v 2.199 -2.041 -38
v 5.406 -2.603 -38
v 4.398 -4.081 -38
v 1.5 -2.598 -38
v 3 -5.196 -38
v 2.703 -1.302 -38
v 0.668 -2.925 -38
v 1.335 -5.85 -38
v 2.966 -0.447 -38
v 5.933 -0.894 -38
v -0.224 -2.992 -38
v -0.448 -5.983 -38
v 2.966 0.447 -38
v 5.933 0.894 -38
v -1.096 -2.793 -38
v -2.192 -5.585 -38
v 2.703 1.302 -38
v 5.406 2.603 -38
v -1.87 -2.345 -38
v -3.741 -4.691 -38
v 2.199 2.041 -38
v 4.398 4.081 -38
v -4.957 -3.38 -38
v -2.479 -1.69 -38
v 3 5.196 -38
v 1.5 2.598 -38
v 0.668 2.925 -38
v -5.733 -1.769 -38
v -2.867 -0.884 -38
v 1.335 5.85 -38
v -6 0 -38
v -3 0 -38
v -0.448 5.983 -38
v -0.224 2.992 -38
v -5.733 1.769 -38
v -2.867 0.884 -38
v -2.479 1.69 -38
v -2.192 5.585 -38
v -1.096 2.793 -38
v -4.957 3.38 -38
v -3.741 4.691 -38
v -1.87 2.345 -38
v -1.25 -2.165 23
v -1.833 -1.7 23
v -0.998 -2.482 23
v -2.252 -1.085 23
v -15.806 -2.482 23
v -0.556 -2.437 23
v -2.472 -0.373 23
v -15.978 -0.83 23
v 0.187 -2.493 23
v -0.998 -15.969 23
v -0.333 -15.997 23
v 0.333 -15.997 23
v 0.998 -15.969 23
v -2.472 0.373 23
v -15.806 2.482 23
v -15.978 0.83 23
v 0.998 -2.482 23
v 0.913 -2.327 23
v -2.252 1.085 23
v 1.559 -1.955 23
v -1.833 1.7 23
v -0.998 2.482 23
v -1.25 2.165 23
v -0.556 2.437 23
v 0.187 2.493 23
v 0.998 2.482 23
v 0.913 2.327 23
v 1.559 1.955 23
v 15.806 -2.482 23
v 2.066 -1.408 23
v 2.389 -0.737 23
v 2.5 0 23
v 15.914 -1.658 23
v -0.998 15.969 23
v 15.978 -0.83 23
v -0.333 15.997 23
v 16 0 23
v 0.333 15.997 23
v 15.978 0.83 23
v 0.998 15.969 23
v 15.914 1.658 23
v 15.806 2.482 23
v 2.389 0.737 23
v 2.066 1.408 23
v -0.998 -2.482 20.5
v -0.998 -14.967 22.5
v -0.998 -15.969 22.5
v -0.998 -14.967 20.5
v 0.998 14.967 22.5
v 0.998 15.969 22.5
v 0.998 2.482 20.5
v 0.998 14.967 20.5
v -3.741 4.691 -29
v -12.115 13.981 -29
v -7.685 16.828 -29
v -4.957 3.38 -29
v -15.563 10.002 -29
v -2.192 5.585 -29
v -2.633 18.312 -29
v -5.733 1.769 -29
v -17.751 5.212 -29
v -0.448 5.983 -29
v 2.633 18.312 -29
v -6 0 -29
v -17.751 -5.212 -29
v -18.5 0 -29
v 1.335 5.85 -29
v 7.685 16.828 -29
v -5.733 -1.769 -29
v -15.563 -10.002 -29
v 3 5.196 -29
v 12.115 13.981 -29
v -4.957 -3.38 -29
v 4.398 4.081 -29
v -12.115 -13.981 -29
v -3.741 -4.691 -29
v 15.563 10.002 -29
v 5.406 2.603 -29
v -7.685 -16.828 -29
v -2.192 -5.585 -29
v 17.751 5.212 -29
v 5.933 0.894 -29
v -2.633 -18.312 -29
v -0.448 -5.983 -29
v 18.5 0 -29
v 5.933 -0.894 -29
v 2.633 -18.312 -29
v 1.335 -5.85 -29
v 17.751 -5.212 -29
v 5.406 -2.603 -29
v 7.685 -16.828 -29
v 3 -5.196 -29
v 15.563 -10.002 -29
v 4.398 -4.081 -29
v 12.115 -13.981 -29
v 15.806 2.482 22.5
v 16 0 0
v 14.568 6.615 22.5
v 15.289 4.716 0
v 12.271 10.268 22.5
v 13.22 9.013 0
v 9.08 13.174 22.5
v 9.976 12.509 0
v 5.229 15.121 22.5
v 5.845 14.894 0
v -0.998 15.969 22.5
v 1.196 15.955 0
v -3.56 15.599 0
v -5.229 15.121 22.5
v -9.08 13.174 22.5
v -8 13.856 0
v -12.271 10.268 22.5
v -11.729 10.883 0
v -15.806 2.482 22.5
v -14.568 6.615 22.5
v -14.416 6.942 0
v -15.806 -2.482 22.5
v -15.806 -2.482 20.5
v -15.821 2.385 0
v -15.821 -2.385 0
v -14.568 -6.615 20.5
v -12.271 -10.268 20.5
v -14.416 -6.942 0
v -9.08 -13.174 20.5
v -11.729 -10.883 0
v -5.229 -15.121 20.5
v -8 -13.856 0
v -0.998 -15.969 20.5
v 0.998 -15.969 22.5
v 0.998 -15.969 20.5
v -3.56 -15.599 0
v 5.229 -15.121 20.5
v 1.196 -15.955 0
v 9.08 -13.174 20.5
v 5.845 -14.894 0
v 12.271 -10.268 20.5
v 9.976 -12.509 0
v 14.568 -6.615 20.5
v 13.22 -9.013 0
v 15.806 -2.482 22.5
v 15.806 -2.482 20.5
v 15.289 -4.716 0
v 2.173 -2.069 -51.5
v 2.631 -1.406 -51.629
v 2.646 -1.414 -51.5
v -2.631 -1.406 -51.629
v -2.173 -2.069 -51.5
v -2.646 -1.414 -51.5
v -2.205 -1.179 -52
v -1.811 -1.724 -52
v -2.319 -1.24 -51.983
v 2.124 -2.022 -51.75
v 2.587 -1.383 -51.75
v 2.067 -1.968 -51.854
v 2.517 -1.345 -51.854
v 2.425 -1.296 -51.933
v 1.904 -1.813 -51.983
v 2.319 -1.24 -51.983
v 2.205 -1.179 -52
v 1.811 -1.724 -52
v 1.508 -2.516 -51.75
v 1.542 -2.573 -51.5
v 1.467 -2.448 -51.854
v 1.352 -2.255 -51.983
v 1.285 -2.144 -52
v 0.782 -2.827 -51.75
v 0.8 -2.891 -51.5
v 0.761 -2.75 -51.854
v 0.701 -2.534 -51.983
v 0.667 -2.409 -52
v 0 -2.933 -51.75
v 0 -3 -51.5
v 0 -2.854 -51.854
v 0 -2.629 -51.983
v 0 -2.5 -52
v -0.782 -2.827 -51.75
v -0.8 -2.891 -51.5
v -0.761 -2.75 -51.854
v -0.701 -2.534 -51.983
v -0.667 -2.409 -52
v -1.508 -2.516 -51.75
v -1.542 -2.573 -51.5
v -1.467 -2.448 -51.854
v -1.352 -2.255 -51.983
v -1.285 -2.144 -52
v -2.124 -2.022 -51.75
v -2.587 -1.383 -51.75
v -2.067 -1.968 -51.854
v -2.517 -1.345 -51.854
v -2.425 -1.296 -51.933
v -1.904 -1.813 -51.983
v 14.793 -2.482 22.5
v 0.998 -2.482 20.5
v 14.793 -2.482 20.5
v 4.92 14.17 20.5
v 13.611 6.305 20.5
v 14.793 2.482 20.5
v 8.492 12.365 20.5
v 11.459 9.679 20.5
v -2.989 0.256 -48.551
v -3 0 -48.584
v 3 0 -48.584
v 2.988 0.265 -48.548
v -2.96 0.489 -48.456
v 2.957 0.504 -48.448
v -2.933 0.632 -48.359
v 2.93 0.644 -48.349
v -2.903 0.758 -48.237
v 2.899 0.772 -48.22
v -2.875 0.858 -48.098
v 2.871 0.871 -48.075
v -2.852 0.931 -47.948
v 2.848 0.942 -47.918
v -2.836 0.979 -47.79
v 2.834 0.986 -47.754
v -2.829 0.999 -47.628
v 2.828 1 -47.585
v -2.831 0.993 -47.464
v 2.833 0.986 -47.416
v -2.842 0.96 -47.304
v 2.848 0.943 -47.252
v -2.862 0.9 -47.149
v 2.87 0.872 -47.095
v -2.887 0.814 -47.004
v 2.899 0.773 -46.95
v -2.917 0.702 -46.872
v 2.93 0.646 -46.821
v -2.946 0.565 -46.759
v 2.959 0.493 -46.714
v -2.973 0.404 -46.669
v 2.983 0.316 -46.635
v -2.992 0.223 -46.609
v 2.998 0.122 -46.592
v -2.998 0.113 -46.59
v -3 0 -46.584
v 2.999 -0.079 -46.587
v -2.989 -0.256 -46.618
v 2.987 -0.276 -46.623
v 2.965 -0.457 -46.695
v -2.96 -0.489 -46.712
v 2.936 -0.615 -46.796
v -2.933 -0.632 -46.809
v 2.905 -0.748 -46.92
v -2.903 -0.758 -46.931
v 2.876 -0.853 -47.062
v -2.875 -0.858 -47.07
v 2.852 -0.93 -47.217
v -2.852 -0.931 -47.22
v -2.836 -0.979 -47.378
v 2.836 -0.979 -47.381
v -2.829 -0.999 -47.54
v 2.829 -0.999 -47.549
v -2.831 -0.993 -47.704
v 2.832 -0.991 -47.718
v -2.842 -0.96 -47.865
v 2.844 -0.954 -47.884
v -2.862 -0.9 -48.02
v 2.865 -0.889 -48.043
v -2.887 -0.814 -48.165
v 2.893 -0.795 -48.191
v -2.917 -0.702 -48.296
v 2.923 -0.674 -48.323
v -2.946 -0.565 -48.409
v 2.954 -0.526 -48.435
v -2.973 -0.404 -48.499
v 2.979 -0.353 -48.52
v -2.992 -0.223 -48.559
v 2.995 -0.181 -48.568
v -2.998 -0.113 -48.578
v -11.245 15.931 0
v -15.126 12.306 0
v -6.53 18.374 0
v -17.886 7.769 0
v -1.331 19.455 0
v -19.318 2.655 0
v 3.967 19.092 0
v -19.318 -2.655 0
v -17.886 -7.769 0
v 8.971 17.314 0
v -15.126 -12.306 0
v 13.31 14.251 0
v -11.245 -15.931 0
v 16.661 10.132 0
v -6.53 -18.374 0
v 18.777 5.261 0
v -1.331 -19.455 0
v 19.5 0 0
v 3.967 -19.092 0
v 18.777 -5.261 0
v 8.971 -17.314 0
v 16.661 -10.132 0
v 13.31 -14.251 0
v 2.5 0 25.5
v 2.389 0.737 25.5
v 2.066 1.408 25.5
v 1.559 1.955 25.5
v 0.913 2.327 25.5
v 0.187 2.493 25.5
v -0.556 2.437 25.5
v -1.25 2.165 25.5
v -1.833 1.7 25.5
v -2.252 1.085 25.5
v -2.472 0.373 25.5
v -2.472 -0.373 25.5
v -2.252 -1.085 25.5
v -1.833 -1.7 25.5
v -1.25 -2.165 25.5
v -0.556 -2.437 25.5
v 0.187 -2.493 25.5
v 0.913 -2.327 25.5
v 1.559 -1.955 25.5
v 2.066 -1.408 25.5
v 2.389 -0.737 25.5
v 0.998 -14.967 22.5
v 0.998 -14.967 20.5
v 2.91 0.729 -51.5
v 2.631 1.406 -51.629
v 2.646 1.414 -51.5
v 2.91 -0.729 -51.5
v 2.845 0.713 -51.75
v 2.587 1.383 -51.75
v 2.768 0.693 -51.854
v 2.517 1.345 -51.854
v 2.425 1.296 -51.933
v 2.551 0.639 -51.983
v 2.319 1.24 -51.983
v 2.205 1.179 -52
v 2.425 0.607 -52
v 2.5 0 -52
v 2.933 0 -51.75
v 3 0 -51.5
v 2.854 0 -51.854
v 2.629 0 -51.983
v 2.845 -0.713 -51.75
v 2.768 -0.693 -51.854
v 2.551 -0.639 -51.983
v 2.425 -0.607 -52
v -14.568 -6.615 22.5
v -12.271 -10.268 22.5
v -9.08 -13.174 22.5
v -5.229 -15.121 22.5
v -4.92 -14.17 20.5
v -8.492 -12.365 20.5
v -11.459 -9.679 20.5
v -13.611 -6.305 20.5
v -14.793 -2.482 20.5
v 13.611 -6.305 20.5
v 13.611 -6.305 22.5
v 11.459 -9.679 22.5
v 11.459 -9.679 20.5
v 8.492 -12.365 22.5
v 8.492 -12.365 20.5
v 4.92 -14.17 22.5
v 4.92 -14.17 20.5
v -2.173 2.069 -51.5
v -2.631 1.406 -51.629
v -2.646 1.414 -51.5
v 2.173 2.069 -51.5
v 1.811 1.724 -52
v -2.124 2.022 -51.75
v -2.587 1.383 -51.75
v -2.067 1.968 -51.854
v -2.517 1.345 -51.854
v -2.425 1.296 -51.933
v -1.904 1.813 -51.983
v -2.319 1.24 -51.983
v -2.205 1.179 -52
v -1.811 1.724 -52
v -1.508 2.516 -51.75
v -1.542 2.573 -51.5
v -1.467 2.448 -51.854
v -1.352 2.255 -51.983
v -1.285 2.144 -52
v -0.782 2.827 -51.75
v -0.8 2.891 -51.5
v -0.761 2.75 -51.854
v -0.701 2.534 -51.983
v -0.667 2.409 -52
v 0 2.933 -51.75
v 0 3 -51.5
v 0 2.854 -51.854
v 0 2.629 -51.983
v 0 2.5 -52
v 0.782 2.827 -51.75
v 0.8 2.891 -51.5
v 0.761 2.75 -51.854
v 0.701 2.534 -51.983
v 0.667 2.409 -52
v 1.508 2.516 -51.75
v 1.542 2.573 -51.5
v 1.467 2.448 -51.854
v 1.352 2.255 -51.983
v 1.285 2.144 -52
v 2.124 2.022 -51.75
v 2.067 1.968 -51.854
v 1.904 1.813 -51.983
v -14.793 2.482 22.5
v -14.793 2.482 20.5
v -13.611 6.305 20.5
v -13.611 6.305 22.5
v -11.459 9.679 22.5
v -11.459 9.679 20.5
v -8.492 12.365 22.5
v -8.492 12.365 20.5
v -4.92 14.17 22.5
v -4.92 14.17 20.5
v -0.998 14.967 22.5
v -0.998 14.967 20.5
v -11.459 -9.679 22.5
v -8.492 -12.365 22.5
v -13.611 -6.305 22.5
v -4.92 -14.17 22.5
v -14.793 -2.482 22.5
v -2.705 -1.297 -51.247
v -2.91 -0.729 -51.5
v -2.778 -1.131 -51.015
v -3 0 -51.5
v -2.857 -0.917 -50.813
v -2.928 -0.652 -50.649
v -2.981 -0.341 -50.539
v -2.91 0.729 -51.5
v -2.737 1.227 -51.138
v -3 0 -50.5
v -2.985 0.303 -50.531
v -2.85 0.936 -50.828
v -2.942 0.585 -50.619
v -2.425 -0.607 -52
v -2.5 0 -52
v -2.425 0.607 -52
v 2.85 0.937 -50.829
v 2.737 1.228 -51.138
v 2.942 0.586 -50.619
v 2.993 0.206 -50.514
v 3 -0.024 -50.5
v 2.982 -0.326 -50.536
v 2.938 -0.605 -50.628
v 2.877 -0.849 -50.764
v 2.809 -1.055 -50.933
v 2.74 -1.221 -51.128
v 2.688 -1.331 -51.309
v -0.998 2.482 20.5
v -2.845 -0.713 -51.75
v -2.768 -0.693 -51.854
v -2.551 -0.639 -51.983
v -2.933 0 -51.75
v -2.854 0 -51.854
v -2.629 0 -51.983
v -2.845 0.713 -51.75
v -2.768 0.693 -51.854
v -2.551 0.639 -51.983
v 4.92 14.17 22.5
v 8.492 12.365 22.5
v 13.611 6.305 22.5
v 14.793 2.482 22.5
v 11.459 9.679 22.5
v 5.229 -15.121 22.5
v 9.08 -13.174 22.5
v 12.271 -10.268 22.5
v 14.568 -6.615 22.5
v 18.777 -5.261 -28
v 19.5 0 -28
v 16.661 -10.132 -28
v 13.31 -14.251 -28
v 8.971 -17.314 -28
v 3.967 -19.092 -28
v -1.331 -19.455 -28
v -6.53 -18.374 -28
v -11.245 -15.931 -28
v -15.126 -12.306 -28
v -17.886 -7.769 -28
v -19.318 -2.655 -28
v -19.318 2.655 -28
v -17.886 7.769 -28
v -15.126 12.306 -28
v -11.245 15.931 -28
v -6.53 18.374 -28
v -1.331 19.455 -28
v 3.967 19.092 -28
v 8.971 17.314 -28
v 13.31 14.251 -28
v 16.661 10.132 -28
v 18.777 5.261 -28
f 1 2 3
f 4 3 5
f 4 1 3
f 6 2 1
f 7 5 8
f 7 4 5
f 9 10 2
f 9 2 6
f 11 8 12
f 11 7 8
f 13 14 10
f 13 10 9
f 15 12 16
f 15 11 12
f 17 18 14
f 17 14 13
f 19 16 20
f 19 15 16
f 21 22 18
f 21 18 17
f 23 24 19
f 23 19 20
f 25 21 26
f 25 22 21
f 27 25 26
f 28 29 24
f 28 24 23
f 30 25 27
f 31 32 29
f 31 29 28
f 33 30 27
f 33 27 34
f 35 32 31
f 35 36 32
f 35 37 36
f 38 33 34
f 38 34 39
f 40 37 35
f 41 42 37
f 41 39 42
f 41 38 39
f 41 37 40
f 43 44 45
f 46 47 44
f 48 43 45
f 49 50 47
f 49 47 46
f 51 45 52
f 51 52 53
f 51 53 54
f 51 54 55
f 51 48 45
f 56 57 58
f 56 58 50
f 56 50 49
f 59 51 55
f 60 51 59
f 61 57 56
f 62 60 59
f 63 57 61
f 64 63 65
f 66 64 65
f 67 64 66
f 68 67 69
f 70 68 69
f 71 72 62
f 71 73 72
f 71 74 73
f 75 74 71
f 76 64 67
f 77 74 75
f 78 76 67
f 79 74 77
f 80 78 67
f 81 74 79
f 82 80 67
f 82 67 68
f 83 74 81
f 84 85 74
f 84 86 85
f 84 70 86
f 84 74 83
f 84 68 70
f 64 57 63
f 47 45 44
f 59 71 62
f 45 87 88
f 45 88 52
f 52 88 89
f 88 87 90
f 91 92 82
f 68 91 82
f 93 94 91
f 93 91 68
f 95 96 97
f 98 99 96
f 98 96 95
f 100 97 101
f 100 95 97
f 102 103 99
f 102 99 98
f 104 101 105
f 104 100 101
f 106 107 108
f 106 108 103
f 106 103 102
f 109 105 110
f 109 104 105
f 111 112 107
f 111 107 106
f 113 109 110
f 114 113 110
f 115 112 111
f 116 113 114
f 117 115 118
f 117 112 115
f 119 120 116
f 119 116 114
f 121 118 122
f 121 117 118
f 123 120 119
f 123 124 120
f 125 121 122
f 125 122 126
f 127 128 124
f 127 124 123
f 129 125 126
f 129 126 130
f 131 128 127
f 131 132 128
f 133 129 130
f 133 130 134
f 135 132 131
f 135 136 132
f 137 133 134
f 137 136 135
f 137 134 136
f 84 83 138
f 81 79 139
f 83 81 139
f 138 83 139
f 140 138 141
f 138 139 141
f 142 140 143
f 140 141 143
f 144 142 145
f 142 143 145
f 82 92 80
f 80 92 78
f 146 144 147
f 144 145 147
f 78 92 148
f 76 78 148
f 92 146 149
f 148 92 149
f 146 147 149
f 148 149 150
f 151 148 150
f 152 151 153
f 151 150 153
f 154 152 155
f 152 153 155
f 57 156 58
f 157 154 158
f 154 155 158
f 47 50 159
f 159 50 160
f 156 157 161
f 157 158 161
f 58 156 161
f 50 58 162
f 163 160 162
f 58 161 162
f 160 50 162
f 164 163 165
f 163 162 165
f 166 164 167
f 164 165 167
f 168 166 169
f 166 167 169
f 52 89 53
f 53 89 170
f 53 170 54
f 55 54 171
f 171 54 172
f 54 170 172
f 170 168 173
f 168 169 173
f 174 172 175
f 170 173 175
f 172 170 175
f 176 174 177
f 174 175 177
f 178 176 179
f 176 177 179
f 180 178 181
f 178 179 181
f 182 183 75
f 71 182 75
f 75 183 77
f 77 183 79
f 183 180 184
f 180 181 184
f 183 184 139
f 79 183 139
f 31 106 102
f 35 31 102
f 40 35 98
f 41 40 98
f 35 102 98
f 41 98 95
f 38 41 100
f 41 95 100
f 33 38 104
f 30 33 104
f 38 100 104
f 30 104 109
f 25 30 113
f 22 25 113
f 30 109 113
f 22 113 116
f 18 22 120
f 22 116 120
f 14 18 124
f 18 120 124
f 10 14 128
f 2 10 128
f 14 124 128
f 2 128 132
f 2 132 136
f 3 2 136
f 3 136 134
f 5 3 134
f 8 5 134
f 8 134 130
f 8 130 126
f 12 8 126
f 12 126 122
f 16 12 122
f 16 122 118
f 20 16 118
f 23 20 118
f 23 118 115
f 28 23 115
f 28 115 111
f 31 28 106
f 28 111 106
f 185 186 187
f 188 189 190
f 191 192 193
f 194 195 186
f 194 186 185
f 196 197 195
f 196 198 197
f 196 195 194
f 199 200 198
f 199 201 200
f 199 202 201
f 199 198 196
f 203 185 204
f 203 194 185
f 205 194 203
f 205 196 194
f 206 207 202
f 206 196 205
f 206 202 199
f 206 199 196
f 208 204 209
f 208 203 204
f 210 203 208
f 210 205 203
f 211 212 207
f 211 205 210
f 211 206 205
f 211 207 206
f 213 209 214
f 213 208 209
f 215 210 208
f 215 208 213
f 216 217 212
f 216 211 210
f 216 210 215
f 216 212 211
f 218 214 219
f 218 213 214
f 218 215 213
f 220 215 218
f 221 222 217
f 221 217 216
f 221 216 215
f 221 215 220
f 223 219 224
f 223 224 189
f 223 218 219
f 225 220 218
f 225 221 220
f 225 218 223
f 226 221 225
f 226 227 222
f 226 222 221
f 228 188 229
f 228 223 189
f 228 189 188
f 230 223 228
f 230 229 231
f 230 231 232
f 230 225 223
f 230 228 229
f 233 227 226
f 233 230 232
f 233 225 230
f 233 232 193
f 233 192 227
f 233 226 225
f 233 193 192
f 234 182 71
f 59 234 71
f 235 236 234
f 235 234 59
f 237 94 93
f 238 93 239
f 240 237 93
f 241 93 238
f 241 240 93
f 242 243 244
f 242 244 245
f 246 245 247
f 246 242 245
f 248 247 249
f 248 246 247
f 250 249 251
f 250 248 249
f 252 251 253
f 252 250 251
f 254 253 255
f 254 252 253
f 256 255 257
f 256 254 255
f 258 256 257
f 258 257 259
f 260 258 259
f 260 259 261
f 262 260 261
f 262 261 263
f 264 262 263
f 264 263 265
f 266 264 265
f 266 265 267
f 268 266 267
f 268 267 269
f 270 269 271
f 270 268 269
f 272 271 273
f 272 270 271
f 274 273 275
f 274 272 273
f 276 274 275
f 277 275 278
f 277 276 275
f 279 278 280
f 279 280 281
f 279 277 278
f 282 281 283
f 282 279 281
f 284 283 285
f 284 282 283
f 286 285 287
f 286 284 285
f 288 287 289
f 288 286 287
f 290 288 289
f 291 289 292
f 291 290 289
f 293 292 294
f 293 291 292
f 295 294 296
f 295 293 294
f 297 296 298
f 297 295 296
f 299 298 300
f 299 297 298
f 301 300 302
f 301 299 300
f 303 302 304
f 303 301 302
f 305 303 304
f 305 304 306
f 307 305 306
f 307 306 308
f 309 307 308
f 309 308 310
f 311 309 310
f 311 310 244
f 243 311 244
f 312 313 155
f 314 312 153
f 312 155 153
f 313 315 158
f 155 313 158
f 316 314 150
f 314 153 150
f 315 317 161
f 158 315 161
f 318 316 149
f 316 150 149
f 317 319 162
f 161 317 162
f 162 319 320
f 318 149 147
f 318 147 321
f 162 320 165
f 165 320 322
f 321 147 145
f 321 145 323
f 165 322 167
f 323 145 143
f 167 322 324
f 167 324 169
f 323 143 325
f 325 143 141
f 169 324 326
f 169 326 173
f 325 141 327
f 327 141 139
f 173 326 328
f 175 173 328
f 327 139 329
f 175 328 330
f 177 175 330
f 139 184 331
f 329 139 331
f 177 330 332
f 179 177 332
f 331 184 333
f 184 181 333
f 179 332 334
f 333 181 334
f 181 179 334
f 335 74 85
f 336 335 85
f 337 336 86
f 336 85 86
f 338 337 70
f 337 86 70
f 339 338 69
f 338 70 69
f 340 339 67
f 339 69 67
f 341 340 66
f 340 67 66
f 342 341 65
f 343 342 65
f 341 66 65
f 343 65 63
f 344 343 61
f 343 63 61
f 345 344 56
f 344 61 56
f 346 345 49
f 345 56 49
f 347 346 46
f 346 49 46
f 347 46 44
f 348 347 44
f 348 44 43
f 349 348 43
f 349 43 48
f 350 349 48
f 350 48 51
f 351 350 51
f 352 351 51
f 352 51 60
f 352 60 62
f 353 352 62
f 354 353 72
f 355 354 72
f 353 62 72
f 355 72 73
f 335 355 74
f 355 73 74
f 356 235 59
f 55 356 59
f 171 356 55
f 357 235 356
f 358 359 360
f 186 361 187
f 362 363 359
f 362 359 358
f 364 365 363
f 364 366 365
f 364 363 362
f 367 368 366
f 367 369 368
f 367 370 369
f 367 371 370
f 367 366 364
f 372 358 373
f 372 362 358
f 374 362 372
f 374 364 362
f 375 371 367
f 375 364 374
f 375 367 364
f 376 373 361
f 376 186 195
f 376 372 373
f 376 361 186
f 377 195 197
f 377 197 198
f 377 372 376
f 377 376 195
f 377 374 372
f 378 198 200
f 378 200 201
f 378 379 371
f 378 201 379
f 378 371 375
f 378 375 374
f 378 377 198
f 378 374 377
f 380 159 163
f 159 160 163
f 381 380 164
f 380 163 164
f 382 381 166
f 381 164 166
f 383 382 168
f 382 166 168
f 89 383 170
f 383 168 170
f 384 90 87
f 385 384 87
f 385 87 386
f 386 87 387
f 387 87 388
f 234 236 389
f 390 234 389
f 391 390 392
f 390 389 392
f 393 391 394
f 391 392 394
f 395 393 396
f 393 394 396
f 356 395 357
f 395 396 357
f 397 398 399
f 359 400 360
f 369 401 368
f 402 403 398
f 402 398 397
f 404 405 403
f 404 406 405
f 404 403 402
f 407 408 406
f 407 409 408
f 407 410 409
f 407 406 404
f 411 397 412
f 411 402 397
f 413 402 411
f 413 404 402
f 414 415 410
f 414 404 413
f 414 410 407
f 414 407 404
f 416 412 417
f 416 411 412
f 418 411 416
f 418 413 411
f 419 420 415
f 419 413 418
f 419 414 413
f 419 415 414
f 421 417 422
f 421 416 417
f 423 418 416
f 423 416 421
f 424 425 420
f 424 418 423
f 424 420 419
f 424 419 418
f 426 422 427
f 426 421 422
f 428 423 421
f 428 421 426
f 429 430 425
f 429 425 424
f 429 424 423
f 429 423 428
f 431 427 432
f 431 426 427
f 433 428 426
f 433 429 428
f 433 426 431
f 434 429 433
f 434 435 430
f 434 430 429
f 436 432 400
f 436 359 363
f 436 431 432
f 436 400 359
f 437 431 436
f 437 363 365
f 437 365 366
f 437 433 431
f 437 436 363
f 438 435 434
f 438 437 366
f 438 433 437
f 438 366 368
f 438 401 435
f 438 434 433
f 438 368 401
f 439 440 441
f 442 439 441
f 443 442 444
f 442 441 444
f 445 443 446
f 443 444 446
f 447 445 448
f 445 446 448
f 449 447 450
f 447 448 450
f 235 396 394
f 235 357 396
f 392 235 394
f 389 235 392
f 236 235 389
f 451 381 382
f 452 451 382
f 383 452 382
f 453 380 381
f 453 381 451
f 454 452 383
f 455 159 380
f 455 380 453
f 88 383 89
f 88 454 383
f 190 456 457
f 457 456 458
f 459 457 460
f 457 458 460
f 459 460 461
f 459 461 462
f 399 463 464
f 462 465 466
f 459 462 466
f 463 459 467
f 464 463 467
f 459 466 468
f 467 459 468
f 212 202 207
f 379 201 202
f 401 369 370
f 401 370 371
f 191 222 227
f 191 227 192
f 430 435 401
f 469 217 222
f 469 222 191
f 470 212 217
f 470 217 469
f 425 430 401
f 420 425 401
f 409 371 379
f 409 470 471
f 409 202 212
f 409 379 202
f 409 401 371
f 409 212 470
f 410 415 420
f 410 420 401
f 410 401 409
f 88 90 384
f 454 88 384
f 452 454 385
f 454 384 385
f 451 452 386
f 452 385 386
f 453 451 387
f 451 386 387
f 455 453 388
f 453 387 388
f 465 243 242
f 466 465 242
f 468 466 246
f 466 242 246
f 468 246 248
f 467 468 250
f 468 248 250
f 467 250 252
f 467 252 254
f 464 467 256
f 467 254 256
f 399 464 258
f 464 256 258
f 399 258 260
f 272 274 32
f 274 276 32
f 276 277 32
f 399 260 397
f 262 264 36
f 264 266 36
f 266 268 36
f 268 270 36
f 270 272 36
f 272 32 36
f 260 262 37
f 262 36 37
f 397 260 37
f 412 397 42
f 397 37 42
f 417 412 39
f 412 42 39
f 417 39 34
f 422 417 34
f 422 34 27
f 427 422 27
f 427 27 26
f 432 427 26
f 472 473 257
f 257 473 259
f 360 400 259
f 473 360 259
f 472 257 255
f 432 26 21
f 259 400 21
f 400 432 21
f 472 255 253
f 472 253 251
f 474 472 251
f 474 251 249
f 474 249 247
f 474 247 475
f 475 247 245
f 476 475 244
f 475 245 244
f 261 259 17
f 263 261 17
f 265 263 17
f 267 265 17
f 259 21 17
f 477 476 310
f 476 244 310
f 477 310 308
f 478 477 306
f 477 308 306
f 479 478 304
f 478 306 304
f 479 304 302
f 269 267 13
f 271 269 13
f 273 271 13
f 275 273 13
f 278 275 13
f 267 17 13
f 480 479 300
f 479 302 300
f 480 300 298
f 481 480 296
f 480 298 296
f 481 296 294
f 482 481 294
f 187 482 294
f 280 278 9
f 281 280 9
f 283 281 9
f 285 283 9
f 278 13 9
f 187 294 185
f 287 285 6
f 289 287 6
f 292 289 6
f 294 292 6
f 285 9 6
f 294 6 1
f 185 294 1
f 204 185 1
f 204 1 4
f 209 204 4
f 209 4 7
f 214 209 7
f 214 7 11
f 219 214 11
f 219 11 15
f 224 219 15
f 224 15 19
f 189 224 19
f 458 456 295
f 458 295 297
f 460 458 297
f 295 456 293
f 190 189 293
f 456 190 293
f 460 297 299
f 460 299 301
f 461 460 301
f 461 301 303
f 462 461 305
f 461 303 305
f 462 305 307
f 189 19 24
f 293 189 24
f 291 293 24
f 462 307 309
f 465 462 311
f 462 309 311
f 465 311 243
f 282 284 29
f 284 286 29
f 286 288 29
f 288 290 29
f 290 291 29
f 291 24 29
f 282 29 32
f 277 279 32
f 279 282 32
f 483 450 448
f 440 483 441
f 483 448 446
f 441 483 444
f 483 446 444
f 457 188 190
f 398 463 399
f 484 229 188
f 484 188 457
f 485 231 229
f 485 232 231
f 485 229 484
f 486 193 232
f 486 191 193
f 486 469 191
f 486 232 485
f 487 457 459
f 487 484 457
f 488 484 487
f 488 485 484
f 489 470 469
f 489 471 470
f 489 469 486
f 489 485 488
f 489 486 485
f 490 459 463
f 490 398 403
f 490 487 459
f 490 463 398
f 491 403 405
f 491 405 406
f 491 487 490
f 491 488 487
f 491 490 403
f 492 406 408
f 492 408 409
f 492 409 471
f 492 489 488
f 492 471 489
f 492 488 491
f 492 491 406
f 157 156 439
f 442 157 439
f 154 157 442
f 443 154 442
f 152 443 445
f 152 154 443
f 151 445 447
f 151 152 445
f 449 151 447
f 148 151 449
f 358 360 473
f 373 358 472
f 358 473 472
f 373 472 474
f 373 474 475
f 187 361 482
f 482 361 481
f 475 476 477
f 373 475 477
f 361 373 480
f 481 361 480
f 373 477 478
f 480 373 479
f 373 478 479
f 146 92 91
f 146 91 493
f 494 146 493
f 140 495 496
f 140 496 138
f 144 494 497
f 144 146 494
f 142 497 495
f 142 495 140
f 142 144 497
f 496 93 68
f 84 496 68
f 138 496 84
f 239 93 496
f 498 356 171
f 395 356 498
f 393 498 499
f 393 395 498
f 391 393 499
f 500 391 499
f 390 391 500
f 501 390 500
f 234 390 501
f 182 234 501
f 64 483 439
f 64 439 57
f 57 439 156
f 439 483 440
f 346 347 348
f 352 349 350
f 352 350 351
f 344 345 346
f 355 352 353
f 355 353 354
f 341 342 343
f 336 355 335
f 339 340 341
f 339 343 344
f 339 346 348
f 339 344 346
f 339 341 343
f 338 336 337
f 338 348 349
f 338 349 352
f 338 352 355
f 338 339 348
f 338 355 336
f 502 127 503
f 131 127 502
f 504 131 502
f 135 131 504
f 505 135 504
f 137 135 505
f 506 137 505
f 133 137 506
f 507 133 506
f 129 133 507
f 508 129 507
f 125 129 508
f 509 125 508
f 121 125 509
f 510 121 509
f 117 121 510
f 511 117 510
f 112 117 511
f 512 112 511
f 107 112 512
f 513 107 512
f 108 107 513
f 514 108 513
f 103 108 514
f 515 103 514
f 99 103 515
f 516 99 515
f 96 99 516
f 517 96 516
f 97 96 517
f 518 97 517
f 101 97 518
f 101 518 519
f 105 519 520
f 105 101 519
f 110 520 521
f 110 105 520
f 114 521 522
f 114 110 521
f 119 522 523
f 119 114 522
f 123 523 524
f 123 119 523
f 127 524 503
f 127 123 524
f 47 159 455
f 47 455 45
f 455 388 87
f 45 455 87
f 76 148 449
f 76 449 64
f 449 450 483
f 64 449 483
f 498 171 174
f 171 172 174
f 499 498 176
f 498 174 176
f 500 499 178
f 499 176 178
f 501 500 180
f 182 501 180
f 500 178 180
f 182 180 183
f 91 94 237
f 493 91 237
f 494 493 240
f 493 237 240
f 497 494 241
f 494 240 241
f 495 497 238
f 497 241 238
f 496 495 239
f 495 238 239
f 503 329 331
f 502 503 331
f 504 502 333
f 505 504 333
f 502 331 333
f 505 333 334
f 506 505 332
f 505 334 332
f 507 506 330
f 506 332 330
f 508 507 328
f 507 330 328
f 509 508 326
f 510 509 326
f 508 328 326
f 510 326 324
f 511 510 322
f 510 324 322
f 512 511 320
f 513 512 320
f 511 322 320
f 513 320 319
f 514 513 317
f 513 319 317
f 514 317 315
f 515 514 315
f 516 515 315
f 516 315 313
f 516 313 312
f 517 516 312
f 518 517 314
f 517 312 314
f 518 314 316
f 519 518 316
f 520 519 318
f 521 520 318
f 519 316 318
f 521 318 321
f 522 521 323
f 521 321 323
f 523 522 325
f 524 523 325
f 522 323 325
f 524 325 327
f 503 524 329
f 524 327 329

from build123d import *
from build123d.topology import SkipClean

# Parameters (mm, degrees)
SKETCH1_R               = 16
BOSS_EXTRUDE1_DEPTH     = 23
SKETCH2_R               = 19.5
BOSS_EXTRUDE2_DEPTH     = 29
SKETCH3_R               = 6
BOSS_EXTRUDE4_DEPTH     = 9
SKETCH4_R               = 3
BOSS_EXTRUDE5_DEPTH     = 22
CUT_EXTRUDE2_DEPTH      = 22
CUT_EXTRUDE2_DEPTH_BACK = 22
SKETCH5_R               = 1.5
CUT_EXTRUDE4_START      = -2.5
CUT_EXTRUDE4_DEPTH      = 2.5
SKETCH7_R               = 2.5
BOSS_EXTRUDE6_DEPTH     = 2.5
BOSS_EXTRUDE7_DEPTH     = 2
CHAMFER1_SIZE           = 1
FILLET1_R               = 1
BOSS_EXTRUDE8_START     = -22
SKETCH9_R               = 3
BOSS_EXTRUDE8_DEPTH     = 22
CUT_EXTRUDE6_START      = -8
SKETCH10_R              = 3
CUT_EXTRUDE6_DEPTH      = 8
FILLET2_R               = 0.5
CUT_EXTRUDE7_DEPTH      = 59.860003398
CUT_EXTRUDE7_DEPTH_BACK = 59.860003398
SKETCH11_R              = 1


with BuildPart() as part:
    # Sketch1 → Boss-Extrude1 (new body)
    with BuildSketch(Plane.XY):
        Circle(SKETCH1_R)
    extrude(amount=BOSS_EXTRUDE1_DEPTH)

    # Sketch2 → Boss-Extrude2 (add)
    with BuildSketch(Plane(origin=(0, 0, 0), x_dir=(-1, 0, 0), z_dir=(0, 0, -1))):
        Circle(SKETCH2_R)
    extrude(amount=BOSS_EXTRUDE2_DEPTH)

    # Sketch3 → Boss-Extrude4 (add)
    with BuildSketch(Plane(origin=(0, 0, -29), x_dir=(-1, 0, 0), z_dir=(0, 0, -1))):
        Circle(SKETCH3_R)
    extrude(amount=BOSS_EXTRUDE4_DEPTH)

    # Sketch4 → Boss-Extrude5 (add)
    with BuildSketch(Plane(origin=(0, 0, -38), x_dir=(-1, 0, 0), z_dir=(0, 0, -1))):
        Circle(SKETCH4_R)
    extrude(amount=BOSS_EXTRUDE5_DEPTH)

    # Sketch5 → Cut-Extrude2 (cut, two sides: drawn at the far end of the back side and taken through both)
    with BuildSketch(Plane(origin=(0, 0, 0), x_dir=(0, 0, -1), z_dir=(1, 0, 0)).offset(-CUT_EXTRUDE2_DEPTH_BACK)):
        with Locations((52, 0)):
            Circle(SKETCH5_R)
    extrude(amount=CUT_EXTRUDE2_DEPTH + CUT_EXTRUDE2_DEPTH_BACK, mode=Mode.SUBTRACT)

    # Sketch6 → Cut-Extrude4 (cut)
    with BuildSketch(Plane.XY.offset(23).offset(CUT_EXTRUDE4_START)):
        with BuildLine():
            Line((0.998052578, -2.481549033), (0.998052578, -15.968841256))
            ThreePointArc((0.998052578, -15.968841256), (10.773767775, -11.829029036), (15.806388405, -2.481549033))
            Line((15.806388405, -2.481549033), (0.998052578, -2.481549033))
        make_face()
        with BuildLine():
            Line((-0.998052578, 15.968841256), (-0.998052578, 2.481549033))
            Line((-0.998052578, 2.481549033), (-15.806388405, 2.481549033))
            ThreePointArc((-15.806388405, 2.481549033), (-10.773767775, 11.829029036), (-0.998052578, 15.968841256))
        make_face()
        with BuildLine():
            Line((0.998052578, 15.968841256), (0.998052578, 2.481549033))
            Line((0.998052578, 2.481549033), (15.806388405, 2.481549033))
            ThreePointArc((15.806388405, 2.481549033), (10.773767775, 11.829029036), (0.998052578, 15.968841256))
        make_face()
        with BuildLine():
            Line((-15.806388405, -2.481549033), (-0.998052578, -2.481549033))
            Line((-0.998052578, -2.481549033), (-0.998052578, -15.968841256))
            ThreePointArc((-0.998052578, -15.968841256), (-10.773767775, -11.829029036), (-15.806388405, -2.481549033))
        make_face()
    extrude(amount=CUT_EXTRUDE4_DEPTH, mode=Mode.SUBTRACT)

    # Sketch7 → Boss-Extrude6 (add)
    with BuildSketch(Plane.XY.offset(23)):
        Circle(SKETCH7_R)
    extrude(amount=BOSS_EXTRUDE6_DEPTH)

    # Sketch8 → Boss-Extrude7 (add)
    with BuildSketch(Plane.XY.offset(20.5)):
        with BuildLine():
            Line((-15.806388405, 2.481549033), (-14.793306405, 2.481549033))
            ThreePointArc((-14.793306405, 2.481549033), (-10.065380021, 11.12151631), (-0.998052578, 14.966759537))
            Line((-0.998052578, 14.966759537), (-0.998052578, 15.968841256))
            ThreePointArc((-0.998052578, 15.968841256), (-10.773767775, 11.829029036), (-15.806388405, 2.481549033))
        make_face()
        with BuildLine():
            Line((0.998052578, 15.968841256), (0.998052578, 14.966759537))
            ThreePointArc((0.998052578, 14.966759537), (10.065380021, 11.12151631), (14.793306405, 2.481549033))
            Line((14.793306405, 2.481549033), (15.806388405, 2.481549033))
            ThreePointArc((15.806388405, 2.481549033), (10.773767775, 11.829029036), (0.998052578, 15.968841256))
        make_face()
        with BuildLine():
            Line((15.806388405, -2.481549033), (14.793306405, -2.481549033))
            ThreePointArc((14.793306405, -2.481549033), (10.065380021, -11.12151631), (0.998052578, -14.966759537))
            Line((0.998052578, -14.966759537), (0.998052578, -15.968841256))
            ThreePointArc((0.998052578, -15.968841256), (10.773767775, -11.829029036), (15.806388405, -2.481549033))
        make_face()
        with BuildLine():
            Line((-0.998052578, -15.968841256), (-0.998052578, -14.966759537))
            ThreePointArc((-0.998052578, -14.966759537), (-10.065380021, -11.12151631), (-14.793306405, -2.481549033))
            Line((-14.793306405, -2.481549033), (-15.806388405, -2.481549033))
            ThreePointArc((-15.806388405, -2.481549033), (-10.773767775, -11.829029036), (-0.998052578, -15.968841256))
        make_face()
    extrude(amount=BOSS_EXTRUDE7_DEPTH)

    # Chamfer1
    chamfer1_edges = [part.edges().sort_by_distance(p)[0] for p in [
        (19.5, 0, -29),
    ]]
    chamfer(chamfer1_edges, length=CHAMFER1_SIZE)

    # Fillet1
    fillet1_edges = [part.edges().sort_by_distance(p)[0] for p in [
        (3, 0, -60),
    ]]
    fillet(fillet1_edges, radius=FILLET1_R)

    # Sketch9 → Boss-Extrude8 (add)
    with SkipClean():  # the faces are left unmerged after this step: merging them gives an invalid solid
        with BuildSketch(Plane(origin=(0, 0, -60), x_dir=(-1, 0, 0), z_dir=(0, 0, -1)).offset(BOSS_EXTRUDE8_START)):
            Circle(SKETCH9_R)
        extrude(amount=BOSS_EXTRUDE8_DEPTH)

    # Sketch10 → Cut-Extrude6 (cut)
    with BuildSketch(Plane(origin=(0, 0, -60), x_dir=(-1, 0, 0), z_dir=(0, 0, -1)).offset(CUT_EXTRUDE6_START)):
        Circle(SKETCH10_R)
    extrude(amount=CUT_EXTRUDE6_DEPTH, mode=Mode.SUBTRACT)

    # Fillet2
    fillet2_edges = [part.edges().sort_by_distance(p)[0] for p in [
        (3, 0, -52),
    ]]
    fillet(fillet2_edges, radius=FILLET2_R)

    # Sketch11 → Cut-Extrude7 (cut, two sides: drawn at the far end of the back side and taken through both)
    with BuildSketch(Plane(origin=(0, 0, 0), x_dir=(0, 0, -1), z_dir=(1, 0, 0)).offset(-CUT_EXTRUDE7_DEPTH_BACK)):
        with Locations((47.584115537, 0)):
            Circle(SKETCH11_R)
    extrude(amount=CUT_EXTRUDE7_DEPTH + CUT_EXTRUDE7_DEPTH_BACK, mode=Mode.SUBTRACT)


solid = part.part
